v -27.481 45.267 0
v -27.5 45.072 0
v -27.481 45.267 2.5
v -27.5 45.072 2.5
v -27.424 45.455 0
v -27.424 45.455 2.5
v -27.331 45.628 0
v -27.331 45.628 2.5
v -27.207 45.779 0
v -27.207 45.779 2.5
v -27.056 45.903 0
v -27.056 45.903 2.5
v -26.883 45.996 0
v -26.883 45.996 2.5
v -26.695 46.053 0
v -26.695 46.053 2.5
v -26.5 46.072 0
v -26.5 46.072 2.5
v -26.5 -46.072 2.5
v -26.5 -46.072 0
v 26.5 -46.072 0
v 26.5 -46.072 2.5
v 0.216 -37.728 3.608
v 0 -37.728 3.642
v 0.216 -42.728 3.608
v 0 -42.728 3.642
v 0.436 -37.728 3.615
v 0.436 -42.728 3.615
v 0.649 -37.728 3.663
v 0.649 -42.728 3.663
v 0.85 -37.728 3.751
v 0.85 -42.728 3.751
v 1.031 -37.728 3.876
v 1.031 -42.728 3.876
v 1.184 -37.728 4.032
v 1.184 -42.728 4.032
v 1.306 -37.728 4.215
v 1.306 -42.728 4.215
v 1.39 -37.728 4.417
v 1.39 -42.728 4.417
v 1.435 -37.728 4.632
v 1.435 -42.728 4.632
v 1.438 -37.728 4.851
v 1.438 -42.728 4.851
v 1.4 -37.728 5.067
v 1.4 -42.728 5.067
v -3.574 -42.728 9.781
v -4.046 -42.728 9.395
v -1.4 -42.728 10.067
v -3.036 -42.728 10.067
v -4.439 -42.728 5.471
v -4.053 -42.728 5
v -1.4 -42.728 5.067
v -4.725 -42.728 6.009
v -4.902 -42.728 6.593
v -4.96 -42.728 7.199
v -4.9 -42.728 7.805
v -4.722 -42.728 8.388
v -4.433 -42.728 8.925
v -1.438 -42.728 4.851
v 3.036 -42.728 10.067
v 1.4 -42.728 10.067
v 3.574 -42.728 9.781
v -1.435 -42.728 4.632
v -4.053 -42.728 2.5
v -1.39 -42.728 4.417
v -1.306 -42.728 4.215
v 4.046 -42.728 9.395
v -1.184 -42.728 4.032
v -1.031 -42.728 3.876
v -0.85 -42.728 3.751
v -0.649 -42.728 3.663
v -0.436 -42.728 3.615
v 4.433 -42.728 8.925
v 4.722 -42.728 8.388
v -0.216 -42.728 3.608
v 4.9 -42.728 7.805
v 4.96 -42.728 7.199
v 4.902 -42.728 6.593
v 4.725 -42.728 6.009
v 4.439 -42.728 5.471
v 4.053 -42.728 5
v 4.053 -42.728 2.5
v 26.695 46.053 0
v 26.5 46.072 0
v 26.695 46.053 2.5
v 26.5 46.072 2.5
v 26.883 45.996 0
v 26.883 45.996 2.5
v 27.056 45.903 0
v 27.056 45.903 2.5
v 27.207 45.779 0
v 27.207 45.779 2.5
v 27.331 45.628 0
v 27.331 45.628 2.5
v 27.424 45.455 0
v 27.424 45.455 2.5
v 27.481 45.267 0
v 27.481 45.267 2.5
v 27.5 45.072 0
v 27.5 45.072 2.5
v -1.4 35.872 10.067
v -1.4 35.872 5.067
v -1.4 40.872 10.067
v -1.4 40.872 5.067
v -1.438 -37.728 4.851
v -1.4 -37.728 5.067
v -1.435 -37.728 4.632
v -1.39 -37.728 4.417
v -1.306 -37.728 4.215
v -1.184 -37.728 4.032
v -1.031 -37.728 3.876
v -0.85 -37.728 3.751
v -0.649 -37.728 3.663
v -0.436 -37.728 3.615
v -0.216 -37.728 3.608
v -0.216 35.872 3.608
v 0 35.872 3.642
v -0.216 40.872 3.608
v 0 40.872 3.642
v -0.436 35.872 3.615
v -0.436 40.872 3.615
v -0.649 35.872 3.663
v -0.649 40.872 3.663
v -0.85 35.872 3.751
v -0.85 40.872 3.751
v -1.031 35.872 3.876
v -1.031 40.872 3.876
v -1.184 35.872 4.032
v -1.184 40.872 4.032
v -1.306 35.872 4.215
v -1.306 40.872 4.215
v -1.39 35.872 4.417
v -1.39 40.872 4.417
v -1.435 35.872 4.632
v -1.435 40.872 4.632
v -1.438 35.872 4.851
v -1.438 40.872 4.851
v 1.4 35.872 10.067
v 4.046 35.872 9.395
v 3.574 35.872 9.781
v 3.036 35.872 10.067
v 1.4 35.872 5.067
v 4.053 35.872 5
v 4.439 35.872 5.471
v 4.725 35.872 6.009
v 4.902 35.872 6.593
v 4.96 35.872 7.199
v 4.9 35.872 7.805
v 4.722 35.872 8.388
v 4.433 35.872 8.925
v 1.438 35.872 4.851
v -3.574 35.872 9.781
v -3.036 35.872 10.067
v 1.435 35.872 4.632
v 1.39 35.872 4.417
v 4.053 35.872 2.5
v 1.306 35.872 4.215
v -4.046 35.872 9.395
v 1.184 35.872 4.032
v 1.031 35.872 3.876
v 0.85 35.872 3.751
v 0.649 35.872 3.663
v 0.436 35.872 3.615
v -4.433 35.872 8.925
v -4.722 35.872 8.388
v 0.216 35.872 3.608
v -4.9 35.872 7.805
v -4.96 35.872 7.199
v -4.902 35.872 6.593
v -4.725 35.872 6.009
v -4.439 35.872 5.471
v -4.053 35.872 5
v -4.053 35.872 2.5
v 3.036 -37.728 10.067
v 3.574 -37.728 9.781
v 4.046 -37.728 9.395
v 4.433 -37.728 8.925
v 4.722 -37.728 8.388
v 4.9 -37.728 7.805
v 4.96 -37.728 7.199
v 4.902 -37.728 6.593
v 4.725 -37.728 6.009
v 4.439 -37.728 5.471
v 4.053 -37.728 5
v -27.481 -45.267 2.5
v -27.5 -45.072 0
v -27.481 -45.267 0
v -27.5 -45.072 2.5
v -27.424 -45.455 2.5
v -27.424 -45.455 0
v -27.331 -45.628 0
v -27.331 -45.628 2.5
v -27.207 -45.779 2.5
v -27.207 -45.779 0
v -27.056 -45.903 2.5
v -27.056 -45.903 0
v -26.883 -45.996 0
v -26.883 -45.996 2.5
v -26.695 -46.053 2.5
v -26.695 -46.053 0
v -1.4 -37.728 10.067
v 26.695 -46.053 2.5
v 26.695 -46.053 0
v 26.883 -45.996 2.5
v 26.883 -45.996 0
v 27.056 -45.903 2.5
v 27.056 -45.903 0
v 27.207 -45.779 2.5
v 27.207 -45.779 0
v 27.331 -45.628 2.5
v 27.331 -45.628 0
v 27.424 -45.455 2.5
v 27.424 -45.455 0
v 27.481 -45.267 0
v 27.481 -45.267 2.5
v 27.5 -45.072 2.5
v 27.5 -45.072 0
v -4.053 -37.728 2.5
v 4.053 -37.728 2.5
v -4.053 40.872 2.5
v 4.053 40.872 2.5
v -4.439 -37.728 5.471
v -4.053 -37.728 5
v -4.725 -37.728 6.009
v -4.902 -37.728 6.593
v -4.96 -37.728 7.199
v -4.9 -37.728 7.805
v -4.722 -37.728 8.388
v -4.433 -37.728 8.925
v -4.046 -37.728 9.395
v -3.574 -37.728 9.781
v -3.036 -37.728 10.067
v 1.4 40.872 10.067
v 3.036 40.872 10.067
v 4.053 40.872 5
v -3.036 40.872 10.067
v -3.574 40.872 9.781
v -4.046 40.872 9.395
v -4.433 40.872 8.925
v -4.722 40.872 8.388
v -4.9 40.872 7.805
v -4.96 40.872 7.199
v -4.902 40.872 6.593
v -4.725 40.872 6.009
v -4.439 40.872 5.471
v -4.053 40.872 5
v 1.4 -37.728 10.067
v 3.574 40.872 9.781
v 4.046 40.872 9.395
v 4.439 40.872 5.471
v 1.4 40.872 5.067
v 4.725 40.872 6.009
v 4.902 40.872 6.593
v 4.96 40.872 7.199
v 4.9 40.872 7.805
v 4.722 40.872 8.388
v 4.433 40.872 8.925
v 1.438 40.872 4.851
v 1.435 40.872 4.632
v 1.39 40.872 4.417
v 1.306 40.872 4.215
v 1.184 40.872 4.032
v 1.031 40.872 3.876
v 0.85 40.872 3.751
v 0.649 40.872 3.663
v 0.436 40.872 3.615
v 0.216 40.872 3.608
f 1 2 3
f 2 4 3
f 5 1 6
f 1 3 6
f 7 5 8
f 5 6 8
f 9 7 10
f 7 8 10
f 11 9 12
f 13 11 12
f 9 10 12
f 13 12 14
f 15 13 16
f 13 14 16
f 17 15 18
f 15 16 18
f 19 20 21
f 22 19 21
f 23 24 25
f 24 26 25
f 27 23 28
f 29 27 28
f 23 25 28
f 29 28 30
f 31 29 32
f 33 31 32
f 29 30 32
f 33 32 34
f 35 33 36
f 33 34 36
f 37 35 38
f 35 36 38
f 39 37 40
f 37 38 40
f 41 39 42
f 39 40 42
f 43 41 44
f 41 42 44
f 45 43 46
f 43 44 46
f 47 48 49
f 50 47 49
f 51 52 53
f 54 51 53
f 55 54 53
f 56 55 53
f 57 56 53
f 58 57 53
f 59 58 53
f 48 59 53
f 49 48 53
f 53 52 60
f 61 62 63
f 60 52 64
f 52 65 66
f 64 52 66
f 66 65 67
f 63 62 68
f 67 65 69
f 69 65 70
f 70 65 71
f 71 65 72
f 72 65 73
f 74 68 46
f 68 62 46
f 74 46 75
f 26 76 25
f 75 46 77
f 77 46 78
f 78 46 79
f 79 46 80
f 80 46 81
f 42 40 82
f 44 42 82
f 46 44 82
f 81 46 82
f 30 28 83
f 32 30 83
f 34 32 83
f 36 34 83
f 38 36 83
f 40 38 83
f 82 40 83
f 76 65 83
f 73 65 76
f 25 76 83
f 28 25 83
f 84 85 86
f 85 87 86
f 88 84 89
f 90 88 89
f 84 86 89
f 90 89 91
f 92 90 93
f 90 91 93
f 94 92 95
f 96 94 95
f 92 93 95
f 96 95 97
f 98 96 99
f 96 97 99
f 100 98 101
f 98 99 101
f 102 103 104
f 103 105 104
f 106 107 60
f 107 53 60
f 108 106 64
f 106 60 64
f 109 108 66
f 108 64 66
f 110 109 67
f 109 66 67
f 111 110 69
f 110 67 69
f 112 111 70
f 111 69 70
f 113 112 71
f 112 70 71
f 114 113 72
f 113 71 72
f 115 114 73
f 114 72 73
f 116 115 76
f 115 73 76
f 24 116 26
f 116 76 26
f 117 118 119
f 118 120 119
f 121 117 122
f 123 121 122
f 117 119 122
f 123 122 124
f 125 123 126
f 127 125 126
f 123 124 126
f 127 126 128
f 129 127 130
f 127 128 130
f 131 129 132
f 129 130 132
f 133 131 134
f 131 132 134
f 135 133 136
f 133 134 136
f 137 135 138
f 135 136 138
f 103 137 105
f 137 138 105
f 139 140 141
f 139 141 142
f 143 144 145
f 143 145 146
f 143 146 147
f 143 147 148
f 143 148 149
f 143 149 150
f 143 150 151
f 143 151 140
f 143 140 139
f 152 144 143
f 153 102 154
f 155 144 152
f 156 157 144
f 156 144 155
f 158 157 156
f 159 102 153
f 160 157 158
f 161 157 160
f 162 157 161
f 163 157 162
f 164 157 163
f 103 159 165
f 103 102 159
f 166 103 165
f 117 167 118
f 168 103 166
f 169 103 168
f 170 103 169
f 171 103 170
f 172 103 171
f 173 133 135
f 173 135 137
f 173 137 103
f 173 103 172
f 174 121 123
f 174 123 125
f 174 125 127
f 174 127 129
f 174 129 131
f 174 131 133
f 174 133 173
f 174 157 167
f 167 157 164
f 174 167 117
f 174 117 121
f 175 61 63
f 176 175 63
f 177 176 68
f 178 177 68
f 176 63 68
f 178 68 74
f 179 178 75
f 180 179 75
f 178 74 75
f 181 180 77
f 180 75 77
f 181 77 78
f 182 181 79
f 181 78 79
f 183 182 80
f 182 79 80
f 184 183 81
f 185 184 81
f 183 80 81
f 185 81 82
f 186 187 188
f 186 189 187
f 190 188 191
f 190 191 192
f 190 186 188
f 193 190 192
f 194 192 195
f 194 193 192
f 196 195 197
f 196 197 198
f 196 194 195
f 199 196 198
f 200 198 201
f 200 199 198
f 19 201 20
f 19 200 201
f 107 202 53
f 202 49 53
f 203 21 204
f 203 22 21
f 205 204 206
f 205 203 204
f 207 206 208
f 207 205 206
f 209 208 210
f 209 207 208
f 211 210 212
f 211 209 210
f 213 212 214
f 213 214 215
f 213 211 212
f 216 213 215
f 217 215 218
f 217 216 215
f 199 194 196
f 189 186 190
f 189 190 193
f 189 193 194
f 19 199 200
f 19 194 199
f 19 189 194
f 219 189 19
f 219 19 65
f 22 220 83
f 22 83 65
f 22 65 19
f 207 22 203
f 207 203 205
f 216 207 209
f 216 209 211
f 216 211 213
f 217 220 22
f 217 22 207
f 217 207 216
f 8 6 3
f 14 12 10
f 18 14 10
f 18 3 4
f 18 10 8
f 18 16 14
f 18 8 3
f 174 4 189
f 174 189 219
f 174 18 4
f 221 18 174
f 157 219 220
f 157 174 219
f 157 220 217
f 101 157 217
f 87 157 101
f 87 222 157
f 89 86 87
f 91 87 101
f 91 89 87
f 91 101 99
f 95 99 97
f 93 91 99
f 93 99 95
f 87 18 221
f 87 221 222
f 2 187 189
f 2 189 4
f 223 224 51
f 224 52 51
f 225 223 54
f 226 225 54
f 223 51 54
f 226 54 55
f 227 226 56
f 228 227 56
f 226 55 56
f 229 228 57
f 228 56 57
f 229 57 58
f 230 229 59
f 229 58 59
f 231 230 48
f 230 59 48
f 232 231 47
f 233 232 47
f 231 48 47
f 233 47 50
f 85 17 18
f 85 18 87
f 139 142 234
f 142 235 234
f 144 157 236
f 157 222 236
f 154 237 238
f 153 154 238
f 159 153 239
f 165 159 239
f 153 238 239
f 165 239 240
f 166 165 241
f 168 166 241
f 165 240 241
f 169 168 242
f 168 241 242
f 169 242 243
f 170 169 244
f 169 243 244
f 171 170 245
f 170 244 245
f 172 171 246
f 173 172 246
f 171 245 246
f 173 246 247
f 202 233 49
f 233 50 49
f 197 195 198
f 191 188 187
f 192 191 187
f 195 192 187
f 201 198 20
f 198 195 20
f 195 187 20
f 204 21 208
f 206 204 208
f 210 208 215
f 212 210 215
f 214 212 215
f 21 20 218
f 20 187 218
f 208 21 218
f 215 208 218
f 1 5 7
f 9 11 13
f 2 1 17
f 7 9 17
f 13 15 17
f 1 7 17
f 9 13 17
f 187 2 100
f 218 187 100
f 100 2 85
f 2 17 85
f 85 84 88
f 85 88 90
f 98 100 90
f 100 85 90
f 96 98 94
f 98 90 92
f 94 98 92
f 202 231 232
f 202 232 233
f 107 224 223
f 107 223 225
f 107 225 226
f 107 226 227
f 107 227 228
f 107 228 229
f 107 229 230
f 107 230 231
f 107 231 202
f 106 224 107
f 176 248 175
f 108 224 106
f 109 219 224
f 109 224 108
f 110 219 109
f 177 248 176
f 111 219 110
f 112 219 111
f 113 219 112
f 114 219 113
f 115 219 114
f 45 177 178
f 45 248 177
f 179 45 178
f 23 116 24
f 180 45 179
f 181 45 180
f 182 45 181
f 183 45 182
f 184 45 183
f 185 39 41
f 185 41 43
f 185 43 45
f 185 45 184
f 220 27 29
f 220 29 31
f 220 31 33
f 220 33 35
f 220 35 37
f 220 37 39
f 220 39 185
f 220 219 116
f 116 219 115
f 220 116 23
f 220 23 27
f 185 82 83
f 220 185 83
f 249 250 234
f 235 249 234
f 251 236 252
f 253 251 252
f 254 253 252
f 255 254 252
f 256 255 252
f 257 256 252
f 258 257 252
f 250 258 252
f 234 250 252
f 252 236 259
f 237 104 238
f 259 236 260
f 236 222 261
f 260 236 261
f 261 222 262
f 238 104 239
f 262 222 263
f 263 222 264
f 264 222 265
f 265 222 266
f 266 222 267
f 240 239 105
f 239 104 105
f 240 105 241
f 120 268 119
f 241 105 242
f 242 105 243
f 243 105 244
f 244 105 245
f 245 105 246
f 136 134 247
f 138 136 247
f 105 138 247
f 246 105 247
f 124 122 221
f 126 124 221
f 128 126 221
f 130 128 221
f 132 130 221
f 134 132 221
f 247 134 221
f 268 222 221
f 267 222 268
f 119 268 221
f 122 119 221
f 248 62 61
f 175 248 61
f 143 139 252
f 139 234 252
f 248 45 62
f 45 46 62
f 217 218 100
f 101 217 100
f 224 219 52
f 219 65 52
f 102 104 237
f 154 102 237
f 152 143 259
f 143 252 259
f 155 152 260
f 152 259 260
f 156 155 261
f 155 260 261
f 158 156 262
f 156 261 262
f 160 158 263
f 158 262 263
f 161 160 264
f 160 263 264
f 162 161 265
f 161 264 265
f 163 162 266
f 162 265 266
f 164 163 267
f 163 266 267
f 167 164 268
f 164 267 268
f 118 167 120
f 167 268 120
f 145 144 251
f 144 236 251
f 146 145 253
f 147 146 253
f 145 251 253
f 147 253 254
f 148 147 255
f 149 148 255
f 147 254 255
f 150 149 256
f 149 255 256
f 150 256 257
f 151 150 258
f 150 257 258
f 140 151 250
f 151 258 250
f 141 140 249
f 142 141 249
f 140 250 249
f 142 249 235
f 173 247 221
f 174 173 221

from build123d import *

# Parameters (mm, degrees)
SKETCH1_W           = 55
SKETCH1_H           = 92.14389058
BOSS_EXTRUDE1_DEPTH = 2.5
BOSS_EXTRUDE2_DEPTH = 2.5
BOSS_EXTRUDE3_DEPTH = 2.5
FILLET1_R           = 1


with BuildPart() as part:
    # Sketch1 → Boss-Extrude1 (new body)
    with BuildSketch(Plane.XY):
        Rectangle(SKETCH1_W, SKETCH1_H)
    extrude(amount=BOSS_EXTRUDE1_DEPTH)

    # Sketch6 → Boss-Extrude2 (add, symmetric)
    with BuildSketch(Plane(origin=(0, 38.37194529, 0), x_dir=(1, 0, 0), z_dir=(0, 1, 0))):
        with BuildLine():
            Line((-4.053033857, -5), (-4.053033857, -2.5))
            Line((-4.053033857, -2.5), (4.053033857, -2.5))
            Line((4.053033857, -2.5), (4.053033857, -5))
            ThreePointArc((4.053033857, -5), (4.899562702, -7.805363596), (3.036123017, -10.066838454))
            Line((3.036123017, -10.066838454), (1.4, -10.066838454))
            Line((1.4, -10.066838454), (1.4, -5.066838454))
            ThreePointArc((1.4, -5.066838454), (1.111291087, -3.950394141), (0, -3.642444699))
            ThreePointArc((0, -3.642444699), (-1.111291087, -3.950394141), (-1.4, -5.066838454))
            Line((-1.4, -5.066838454), (-1.4, -10.066838454))
            Line((-1.4, -10.066838454), (-3.036123017, -10.066838454))
            ThreePointArc((-3.036123017, -10.066838454), (-4.899562702, -7.805363596), (-4.053033857, -5))
        make_face()
    extrude(amount=BOSS_EXTRUDE2_DEPTH, both=True)

    # Sketch7 → Boss-Extrude3 (add, symmetric)
    with BuildSketch(Plane(origin=(0, -40.22805471, 0), x_dir=(-1, 0, 0), z_dir=(0, -1, 0))):
        with BuildLine():
            Line((-4.053033857, -5), (-4.053033857, -2.5))
            Line((-4.053033857, -2.5), (4.053033857, -2.5))
            Line((4.053033857, -2.5), (4.053033857, -5))
            ThreePointArc((4.053033857, -5), (4.899562702, -7.805363596), (3.036123017, -10.066838454))
            Line((3.036123017, -10.066838454), (1.4, -10.066838454))
            Line((1.4, -10.066838454), (1.4, -5.066838454))
            ThreePointArc((1.4, -5.066838454), (1.111291087, -3.950394141), (0, -3.642444699))
            ThreePointArc((0, -3.642444699), (-1.111291087, -3.950394141), (-1.4, -5.066838454))
            Line((-1.4, -5.066838454), (-1.4, -10.066838454))
            Line((-1.4, -10.066838454), (-3.036123017, -10.066838454))
            ThreePointArc((-3.036123017, -10.066838454), (-4.899562702, -7.805363596), (-4.053033857, -5))
        make_face()
    extrude(amount=BOSS_EXTRUDE3_DEPTH, both=True)

    # Fillet1
    fillet1_edges = [part.edges().sort_by_distance(p)[0] for p in [
        (-27.5, 46.07194529, 1.25),
        (27.5, 46.07194529, 1.25),
        (27.5, -46.07194529, 1.25),
        (-27.5, -46.07194529, 1.25),
    ]]
    fillet(fillet1_edges, radius=FILLET1_R)


solid = part.part
